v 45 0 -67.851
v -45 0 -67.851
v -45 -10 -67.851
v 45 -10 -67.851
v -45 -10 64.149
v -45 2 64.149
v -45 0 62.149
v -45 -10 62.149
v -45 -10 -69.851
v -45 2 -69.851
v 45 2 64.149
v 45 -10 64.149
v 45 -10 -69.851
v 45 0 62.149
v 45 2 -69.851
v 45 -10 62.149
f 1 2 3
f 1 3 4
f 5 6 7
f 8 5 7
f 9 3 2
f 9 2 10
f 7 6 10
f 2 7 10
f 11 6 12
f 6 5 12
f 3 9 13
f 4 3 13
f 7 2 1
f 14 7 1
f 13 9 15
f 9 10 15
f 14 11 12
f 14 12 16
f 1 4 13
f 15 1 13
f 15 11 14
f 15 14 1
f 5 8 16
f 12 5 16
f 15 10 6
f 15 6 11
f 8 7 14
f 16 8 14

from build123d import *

# Parameters (mm, degrees)
EXTRUDE_1_DEPTH = 2
SKETCH_3_W      = 90
SKETCH_3_H      = 2
EXTRUDE_2_DEPTH = 10


with BuildPart() as part:
    # 草图2 → 凸台-拉伸1 (new body)
    with BuildSketch(Plane(origin=(0, 0, 0), x_dir=(1, 0, 0), z_dir=(0, 1, 0))):
        Polygon((-0.5, 69.85106383), (-45, 69.85106383), (-45, -64.14893617), (45, -64.14893617), (45, 69.85106383), align=None)
    extrude(amount=EXTRUDE_1_DEPTH)

    # 草图3 → 凸台-拉伸2 (add)
    with BuildSketch(Plane(origin=(0, 0, 0), x_dir=(1, 0, 0), z_dir=(0, 1, 0))):
        with Locations((0, 68.85106383)):
            Rectangle(SKETCH_3_W, SKETCH_3_H)
        with Locations((0, -63.14893617)):
            Rectangle(SKETCH_3_W, SKETCH_3_H)
    extrude(amount=-EXTRUDE_2_DEPTH)


solid = part.part
